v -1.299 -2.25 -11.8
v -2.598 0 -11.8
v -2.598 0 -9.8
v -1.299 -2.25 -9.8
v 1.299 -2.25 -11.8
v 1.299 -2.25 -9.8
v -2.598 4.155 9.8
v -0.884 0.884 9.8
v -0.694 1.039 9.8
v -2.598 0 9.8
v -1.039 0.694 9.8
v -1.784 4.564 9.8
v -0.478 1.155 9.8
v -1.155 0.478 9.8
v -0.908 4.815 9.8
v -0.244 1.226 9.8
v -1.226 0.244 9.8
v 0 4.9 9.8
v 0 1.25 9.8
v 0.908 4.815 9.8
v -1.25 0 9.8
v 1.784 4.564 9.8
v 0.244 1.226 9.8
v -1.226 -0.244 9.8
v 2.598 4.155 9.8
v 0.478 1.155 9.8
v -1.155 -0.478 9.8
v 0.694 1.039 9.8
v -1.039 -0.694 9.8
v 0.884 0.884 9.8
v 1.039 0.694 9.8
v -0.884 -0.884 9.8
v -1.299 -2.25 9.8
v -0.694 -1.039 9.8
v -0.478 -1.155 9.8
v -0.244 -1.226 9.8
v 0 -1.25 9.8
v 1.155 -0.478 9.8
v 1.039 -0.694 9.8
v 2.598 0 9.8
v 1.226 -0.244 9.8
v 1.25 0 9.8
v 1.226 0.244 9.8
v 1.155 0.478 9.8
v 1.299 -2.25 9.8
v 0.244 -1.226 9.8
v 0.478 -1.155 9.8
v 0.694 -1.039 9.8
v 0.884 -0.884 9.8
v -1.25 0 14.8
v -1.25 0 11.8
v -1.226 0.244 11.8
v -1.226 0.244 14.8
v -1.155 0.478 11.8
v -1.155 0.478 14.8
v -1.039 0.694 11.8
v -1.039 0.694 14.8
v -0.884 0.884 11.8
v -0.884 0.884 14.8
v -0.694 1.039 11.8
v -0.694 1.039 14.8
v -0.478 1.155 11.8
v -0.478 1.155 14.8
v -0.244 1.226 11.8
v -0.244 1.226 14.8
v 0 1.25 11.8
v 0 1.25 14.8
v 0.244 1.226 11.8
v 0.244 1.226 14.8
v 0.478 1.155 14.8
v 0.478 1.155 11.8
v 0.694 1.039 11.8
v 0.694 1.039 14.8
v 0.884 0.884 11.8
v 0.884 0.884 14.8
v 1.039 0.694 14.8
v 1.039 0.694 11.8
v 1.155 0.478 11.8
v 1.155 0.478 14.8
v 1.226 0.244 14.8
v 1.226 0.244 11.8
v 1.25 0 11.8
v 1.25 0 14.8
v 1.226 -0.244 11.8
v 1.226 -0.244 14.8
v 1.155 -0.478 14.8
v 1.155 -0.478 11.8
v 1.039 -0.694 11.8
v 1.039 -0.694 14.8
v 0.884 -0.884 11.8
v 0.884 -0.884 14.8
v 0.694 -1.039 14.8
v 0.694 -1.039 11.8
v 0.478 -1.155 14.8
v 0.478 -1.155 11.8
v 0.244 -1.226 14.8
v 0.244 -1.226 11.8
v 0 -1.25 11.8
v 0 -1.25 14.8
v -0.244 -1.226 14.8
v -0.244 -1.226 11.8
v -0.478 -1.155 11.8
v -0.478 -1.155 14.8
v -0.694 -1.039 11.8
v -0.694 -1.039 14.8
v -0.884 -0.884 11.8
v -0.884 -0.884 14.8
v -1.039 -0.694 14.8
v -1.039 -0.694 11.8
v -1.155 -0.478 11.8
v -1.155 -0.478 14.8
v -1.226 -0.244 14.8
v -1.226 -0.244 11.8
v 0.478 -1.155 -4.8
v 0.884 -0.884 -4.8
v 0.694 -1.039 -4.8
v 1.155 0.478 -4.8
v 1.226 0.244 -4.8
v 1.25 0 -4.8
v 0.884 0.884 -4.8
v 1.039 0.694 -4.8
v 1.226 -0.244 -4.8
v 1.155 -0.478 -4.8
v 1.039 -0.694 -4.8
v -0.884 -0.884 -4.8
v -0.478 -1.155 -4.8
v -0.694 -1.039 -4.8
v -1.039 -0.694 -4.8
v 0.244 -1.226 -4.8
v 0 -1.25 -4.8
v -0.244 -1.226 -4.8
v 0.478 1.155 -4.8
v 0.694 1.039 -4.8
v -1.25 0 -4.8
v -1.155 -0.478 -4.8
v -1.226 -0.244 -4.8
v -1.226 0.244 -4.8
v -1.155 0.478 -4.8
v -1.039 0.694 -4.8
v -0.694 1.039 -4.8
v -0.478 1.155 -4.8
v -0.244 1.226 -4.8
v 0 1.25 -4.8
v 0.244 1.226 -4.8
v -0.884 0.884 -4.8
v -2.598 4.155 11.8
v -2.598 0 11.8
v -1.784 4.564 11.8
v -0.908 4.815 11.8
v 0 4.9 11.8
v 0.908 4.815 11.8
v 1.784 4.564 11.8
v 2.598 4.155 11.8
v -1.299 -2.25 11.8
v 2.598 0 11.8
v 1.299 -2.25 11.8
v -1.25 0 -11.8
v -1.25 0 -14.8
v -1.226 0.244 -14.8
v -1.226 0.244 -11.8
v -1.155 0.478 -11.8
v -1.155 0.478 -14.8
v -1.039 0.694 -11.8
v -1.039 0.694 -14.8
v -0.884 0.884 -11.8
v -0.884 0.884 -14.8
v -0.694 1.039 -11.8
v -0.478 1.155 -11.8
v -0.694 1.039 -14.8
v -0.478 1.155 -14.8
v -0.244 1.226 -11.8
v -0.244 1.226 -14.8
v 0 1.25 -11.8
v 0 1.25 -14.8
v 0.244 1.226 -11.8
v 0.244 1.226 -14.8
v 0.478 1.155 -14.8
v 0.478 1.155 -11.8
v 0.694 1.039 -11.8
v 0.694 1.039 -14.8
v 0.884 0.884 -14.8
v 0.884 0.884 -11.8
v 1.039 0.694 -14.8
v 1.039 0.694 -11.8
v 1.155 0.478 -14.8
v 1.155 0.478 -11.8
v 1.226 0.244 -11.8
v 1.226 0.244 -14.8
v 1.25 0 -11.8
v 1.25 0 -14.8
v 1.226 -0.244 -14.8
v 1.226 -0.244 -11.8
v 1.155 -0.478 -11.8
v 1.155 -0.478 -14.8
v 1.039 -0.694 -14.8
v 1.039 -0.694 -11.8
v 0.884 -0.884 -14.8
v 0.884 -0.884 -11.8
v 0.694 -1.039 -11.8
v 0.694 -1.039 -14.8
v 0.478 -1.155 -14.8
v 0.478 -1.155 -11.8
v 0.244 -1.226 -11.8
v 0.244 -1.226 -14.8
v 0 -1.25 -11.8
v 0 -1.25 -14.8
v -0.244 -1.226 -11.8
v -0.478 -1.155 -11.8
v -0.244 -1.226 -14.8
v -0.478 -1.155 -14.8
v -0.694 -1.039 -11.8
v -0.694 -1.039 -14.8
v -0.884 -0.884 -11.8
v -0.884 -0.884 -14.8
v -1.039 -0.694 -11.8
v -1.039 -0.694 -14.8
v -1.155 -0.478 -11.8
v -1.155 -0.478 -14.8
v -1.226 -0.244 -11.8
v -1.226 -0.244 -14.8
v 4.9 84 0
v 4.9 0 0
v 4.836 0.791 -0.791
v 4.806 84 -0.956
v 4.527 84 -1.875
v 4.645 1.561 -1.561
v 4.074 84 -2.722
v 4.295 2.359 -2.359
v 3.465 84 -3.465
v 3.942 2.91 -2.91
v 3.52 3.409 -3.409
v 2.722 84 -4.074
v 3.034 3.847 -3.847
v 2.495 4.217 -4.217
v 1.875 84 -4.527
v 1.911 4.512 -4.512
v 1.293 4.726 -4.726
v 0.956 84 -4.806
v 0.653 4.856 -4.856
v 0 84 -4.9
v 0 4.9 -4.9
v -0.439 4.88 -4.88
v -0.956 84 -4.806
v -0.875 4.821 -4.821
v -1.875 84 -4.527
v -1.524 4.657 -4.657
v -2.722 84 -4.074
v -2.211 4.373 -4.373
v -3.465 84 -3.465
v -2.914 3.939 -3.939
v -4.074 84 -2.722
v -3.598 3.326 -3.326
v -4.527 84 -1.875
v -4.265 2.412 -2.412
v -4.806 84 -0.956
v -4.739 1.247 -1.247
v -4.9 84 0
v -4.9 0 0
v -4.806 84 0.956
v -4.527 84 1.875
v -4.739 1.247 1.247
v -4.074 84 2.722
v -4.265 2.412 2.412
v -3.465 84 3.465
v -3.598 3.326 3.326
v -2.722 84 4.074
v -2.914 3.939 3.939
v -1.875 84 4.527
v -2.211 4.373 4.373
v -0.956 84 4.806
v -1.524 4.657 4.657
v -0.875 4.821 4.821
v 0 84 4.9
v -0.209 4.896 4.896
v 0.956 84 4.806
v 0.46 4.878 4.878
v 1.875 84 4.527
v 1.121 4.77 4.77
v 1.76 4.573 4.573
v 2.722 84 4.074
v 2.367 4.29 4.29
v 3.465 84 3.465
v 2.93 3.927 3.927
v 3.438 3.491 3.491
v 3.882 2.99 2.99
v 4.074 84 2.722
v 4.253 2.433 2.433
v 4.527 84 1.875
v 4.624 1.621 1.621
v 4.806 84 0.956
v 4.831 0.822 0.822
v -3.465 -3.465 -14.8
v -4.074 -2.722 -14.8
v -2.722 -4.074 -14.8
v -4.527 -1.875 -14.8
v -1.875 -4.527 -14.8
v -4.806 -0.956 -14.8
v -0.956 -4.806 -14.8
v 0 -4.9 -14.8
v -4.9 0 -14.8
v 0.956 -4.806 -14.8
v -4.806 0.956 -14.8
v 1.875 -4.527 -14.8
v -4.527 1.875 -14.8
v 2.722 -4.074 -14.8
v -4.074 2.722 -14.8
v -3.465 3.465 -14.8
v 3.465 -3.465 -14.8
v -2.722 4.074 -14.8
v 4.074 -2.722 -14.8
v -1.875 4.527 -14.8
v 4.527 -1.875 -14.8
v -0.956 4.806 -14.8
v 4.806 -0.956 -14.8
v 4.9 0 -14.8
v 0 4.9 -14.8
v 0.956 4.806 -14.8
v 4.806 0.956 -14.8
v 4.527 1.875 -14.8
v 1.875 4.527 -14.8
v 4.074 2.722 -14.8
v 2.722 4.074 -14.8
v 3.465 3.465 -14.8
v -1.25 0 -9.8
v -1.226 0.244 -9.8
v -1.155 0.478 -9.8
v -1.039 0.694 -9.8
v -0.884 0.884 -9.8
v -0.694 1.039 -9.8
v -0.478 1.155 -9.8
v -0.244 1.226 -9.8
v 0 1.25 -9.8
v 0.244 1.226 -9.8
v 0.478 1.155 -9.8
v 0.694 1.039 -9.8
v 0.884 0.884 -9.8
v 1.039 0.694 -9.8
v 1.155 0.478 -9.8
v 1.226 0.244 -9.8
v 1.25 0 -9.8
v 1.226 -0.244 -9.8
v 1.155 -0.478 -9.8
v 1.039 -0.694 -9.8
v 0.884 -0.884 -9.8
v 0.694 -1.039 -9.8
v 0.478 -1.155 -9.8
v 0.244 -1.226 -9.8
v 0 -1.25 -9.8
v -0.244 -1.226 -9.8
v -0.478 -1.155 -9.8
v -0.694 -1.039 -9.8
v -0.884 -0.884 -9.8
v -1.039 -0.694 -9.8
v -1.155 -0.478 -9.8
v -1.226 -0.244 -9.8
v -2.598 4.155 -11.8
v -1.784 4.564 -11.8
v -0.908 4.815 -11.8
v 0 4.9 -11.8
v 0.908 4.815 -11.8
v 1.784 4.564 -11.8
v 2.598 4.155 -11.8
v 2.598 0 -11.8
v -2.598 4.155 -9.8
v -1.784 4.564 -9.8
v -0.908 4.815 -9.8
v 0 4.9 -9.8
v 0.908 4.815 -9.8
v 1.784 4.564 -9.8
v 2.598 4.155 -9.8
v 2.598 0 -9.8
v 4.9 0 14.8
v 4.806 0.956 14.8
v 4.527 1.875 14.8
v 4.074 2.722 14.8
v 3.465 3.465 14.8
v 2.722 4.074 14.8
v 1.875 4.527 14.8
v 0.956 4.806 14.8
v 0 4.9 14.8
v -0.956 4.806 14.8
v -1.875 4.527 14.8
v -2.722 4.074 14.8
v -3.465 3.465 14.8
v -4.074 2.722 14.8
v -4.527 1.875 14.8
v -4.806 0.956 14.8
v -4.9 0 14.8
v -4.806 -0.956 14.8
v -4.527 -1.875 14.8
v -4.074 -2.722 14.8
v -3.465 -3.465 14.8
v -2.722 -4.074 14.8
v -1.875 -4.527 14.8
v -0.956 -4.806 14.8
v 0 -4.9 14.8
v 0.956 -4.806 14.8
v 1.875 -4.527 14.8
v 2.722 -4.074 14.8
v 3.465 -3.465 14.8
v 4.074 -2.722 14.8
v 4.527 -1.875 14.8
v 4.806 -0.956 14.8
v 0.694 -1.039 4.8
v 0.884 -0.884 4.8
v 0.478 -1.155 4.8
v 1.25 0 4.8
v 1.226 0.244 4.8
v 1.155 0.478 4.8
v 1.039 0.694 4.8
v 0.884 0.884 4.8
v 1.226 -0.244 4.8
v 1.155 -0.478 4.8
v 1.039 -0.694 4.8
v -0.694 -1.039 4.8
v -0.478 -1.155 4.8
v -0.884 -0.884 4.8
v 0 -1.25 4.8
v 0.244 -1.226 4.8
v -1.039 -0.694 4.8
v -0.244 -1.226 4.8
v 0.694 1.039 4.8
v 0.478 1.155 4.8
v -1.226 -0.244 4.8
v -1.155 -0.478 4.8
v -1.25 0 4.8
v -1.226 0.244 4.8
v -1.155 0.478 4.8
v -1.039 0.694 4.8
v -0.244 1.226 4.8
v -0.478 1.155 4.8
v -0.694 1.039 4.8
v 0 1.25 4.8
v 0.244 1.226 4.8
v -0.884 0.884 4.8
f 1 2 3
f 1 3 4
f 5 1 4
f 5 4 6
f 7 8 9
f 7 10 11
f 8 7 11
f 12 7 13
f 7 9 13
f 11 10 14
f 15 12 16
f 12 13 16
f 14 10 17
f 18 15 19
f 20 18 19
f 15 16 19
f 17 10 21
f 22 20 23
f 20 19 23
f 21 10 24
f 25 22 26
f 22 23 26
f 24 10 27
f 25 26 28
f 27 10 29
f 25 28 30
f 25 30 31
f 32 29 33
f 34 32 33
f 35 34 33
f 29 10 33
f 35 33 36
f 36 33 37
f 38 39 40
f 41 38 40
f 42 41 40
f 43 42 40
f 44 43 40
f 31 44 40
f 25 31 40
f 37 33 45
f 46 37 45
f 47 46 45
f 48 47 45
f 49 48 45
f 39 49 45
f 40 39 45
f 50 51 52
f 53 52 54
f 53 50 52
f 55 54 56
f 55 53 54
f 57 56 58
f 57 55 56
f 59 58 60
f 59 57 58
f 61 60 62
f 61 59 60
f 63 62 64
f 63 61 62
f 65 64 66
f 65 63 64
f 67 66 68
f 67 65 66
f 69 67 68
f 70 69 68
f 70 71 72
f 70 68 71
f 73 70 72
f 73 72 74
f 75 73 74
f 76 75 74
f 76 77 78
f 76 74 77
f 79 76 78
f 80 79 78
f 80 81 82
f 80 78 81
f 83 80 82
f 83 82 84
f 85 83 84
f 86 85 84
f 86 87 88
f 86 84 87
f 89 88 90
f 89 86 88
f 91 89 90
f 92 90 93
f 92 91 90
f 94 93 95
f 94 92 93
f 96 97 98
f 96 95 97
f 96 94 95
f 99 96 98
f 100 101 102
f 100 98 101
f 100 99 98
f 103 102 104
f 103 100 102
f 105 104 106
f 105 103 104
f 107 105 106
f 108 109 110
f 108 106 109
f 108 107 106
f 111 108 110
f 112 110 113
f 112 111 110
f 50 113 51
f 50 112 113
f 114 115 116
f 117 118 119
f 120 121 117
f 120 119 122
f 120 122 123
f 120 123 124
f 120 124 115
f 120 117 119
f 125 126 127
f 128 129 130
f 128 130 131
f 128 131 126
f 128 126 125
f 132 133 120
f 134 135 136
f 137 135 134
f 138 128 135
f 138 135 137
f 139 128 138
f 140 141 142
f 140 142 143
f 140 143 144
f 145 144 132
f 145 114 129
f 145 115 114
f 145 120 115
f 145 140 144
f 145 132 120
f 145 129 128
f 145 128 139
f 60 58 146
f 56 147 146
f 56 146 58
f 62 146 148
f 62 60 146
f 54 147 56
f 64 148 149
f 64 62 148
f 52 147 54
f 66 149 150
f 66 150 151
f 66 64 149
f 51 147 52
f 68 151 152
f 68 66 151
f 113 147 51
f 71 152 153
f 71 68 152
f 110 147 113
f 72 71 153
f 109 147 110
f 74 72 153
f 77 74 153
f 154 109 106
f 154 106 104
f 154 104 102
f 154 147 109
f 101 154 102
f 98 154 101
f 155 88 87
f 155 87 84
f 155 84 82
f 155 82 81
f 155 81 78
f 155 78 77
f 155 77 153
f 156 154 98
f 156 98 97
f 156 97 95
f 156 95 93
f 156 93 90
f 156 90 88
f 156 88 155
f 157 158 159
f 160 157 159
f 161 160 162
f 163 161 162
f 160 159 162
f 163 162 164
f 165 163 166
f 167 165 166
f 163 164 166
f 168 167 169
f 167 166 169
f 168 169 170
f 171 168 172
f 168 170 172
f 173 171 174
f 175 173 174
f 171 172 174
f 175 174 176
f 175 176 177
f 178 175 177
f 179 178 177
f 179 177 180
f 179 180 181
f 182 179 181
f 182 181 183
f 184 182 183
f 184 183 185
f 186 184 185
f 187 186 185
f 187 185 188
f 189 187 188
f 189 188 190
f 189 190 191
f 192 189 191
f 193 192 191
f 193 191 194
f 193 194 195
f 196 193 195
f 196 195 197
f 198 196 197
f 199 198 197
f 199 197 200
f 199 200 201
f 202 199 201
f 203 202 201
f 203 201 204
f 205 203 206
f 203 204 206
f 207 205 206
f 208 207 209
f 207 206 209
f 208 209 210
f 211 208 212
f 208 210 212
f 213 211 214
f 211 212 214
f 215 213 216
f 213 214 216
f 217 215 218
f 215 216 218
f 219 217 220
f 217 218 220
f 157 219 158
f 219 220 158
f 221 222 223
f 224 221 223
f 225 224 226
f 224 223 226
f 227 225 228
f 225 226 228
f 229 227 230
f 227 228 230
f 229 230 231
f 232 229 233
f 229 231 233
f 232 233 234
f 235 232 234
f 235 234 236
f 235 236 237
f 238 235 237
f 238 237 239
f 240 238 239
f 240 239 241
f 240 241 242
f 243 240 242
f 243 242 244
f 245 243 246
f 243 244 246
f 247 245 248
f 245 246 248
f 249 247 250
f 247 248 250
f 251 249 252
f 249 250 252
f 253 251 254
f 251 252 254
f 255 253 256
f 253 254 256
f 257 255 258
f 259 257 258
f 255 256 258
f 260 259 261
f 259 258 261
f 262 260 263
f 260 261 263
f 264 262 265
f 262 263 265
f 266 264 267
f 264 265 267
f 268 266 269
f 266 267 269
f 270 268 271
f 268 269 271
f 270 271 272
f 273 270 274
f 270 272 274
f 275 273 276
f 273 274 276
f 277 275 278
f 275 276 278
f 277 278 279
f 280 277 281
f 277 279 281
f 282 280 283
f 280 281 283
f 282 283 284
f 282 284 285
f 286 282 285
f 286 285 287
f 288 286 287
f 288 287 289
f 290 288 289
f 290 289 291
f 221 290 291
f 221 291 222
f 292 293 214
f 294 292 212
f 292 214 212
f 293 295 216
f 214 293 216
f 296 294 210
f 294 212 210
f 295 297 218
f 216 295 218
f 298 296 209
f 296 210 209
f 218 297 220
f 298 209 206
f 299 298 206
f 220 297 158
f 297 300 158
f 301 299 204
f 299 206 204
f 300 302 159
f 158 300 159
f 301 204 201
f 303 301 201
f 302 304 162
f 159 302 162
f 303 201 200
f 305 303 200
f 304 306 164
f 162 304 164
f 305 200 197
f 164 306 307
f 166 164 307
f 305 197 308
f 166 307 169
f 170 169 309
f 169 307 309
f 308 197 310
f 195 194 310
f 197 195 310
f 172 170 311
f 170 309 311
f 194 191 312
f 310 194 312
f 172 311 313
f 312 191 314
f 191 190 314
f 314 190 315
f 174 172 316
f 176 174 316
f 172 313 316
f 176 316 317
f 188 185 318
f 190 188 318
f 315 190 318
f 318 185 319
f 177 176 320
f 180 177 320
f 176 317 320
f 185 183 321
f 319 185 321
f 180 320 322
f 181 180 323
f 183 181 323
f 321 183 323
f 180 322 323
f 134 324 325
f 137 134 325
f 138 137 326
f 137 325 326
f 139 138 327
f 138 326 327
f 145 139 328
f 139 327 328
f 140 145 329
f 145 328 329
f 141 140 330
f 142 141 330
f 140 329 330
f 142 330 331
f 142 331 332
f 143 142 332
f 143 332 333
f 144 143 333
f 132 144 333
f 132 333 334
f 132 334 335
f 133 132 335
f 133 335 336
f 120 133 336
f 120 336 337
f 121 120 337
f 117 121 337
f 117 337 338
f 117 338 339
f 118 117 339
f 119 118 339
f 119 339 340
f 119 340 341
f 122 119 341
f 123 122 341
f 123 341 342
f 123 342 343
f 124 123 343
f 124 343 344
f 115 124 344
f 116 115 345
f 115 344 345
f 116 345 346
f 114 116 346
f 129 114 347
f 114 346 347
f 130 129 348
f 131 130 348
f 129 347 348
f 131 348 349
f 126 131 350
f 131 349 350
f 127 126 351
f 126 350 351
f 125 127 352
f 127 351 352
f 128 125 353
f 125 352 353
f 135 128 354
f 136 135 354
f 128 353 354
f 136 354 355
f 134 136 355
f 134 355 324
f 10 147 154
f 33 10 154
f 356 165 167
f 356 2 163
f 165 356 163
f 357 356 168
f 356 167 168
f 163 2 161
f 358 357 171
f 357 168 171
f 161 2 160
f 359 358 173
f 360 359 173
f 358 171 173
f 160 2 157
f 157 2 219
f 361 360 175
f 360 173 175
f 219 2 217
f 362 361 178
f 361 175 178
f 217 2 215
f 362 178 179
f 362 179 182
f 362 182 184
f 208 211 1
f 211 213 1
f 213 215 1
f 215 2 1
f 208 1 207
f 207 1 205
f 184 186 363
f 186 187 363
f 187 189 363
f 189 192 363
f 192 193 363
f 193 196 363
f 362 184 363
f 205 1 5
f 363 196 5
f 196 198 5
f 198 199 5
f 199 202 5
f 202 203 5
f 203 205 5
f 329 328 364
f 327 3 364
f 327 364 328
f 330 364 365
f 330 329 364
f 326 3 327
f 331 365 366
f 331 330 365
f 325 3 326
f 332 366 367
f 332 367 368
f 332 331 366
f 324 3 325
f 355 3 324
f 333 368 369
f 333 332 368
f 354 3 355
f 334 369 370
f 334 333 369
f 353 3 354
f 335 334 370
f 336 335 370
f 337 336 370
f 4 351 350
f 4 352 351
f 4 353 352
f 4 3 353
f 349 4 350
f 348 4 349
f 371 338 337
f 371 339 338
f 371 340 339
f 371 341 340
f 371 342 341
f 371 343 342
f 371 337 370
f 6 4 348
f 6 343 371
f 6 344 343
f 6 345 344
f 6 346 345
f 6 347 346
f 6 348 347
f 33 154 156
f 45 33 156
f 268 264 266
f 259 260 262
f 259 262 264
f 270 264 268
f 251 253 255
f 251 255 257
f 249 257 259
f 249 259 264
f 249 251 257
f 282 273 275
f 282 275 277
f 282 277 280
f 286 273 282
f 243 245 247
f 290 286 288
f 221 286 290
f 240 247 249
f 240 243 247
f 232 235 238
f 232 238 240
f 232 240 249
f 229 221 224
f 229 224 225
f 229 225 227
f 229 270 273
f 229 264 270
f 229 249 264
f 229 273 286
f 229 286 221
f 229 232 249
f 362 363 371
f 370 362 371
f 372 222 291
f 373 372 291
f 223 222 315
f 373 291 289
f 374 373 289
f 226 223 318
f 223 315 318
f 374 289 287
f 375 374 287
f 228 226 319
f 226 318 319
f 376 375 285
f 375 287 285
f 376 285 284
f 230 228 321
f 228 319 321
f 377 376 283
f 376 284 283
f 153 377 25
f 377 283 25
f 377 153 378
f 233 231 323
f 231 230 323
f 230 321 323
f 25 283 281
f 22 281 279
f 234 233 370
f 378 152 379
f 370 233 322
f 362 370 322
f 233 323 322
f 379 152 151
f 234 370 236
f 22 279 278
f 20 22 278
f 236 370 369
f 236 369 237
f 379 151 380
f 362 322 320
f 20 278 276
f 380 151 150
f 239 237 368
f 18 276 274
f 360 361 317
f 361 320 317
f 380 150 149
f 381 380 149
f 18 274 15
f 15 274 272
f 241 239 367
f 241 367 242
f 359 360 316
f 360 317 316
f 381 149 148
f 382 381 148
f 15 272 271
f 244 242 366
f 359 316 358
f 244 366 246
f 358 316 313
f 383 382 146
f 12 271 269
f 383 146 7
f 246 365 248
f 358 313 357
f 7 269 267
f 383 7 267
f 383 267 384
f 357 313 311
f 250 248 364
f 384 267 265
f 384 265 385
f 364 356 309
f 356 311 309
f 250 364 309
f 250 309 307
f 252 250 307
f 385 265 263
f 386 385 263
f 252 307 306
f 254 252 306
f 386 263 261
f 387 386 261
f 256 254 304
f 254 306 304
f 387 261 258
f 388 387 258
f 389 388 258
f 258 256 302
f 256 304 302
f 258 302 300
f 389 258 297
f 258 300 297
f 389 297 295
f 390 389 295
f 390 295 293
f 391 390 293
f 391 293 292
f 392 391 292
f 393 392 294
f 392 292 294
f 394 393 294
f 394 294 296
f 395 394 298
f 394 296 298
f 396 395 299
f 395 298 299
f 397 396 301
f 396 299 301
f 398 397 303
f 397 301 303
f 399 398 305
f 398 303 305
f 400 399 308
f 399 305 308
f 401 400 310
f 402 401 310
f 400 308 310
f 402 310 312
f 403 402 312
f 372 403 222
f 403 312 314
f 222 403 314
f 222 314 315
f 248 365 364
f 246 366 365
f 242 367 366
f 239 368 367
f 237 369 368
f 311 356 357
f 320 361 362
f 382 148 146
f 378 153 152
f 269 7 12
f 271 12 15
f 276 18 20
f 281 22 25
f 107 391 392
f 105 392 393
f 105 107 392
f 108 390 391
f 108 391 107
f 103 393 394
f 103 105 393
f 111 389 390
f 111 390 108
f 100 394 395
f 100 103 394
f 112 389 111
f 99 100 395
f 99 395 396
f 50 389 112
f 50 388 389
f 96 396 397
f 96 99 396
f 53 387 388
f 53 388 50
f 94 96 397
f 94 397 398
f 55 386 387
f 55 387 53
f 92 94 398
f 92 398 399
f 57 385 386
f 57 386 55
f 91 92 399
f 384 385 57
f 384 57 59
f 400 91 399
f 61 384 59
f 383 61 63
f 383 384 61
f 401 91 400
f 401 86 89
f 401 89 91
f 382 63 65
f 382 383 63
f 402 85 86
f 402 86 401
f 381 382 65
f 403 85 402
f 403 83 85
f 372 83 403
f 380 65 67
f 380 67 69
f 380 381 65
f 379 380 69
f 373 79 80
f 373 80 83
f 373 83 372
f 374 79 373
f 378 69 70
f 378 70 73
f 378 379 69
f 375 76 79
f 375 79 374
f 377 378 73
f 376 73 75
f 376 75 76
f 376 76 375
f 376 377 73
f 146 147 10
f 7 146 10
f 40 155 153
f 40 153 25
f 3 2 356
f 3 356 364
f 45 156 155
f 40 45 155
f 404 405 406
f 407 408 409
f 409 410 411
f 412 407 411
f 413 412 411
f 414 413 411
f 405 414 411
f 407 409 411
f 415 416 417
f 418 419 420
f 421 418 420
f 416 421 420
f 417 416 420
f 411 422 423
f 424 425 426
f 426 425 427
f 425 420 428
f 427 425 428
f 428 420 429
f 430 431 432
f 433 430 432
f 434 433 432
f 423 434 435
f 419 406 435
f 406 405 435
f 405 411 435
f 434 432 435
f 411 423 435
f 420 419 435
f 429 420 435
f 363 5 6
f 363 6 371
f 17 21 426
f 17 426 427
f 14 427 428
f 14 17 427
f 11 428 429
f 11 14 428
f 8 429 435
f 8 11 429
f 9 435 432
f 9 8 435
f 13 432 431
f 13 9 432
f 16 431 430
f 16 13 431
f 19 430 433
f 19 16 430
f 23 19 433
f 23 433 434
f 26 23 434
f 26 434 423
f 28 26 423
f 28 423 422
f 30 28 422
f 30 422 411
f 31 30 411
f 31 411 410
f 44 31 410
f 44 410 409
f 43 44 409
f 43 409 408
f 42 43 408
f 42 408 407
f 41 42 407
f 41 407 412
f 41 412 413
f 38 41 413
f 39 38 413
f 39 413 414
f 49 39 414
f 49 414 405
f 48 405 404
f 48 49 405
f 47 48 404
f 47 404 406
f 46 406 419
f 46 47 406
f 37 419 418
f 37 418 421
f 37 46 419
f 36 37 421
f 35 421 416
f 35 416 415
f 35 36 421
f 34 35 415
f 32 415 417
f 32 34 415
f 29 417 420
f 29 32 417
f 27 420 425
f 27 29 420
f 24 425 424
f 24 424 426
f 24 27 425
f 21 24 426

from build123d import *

# Parameters (mm, degrees)
BOSS_EXTRUDE1_DEPTH      = 14.8
BOSS_EXTRUDE1_DEPTH_BACK = 14.8
SKETCH1_R                = 4.9
SKETCH2_R                = 4.9
BOSS_EXTRUDE2_DEPTH      = 84
CUT_EXTRUDE1_DEPTH       = 2
SKETCH5_W                = 5.196152422
SKETCH5_H                = 2
CUT_EXTRUDE2_DEPTH       = 12
SKETCH6_R                = 1.25
CUT_EXTRUDE3_DEPTH       = 10


with BuildPart() as part:
    # Sketch1 → Boss-Extrude1 (new, two sides: drawn at the far end of the back side and taken through both)
    with BuildSketch(Plane.XY.offset(-BOSS_EXTRUDE1_DEPTH_BACK)):
        Circle(SKETCH1_R)
    extrude(amount=BOSS_EXTRUDE1_DEPTH + BOSS_EXTRUDE1_DEPTH_BACK)

    # Sketch2 → Boss-Extrude2 (add)
    with BuildSketch(Plane(origin=(0, 0, 0), x_dir=(1, 0, 0), z_dir=(0, 1, 0))):
        Circle(SKETCH2_R)
    extrude(amount=BOSS_EXTRUDE2_DEPTH)

    # Sketch4 → Cut-Extrude1 (cut)
    with BuildSketch(Plane.XY.offset(11.8)):
        Polygon((2.598076211, 0), (1.299038106, 2.25), (-1.299038106, 2.25), (-2.598076211, 0), (-1.299038106, -2.25), (1.299038106, -2.25), align=None)
    cut_extrude1 = extrude(amount=-CUT_EXTRUDE1_DEPTH, mode=Mode.SUBTRACT)

    # Sketch5 → Cut-Extrude2 (cut)
    with BuildSketch(Plane(origin=(0, 0, 0), x_dir=(1, 0, 0), z_dir=(0, 1, 0))):
        with Locations((0, -10.8)):
            Rectangle(SKETCH5_W, SKETCH5_H)
    cut_extrude2 = extrude(amount=CUT_EXTRUDE2_DEPTH, mode=Mode.SUBTRACT)

    # Mirror2: Cut-Extrude1, Cut-Extrude2 across plane
    add(cut_extrude1.mirror(Plane.XY), mode=Mode.SUBTRACT)
    add(cut_extrude2.mirror(Plane.XY), mode=Mode.SUBTRACT)

    # Sketch6 → Cut-Extrude3 (cut)
    with BuildSketch(Plane(origin=(0, 0, -14.8), x_dir=(-1, 0, 0), z_dir=(0, 0, -1))):
        Circle(SKETCH6_R)
    cut_extrude3 = extrude(amount=-CUT_EXTRUDE3_DEPTH, mode=Mode.SUBTRACT)

    # Mirror3: Cut-Extrude3 across plane
    add(cut_extrude3.mirror(Plane.XY), mode=Mode.SUBTRACT)


solid = part.part
